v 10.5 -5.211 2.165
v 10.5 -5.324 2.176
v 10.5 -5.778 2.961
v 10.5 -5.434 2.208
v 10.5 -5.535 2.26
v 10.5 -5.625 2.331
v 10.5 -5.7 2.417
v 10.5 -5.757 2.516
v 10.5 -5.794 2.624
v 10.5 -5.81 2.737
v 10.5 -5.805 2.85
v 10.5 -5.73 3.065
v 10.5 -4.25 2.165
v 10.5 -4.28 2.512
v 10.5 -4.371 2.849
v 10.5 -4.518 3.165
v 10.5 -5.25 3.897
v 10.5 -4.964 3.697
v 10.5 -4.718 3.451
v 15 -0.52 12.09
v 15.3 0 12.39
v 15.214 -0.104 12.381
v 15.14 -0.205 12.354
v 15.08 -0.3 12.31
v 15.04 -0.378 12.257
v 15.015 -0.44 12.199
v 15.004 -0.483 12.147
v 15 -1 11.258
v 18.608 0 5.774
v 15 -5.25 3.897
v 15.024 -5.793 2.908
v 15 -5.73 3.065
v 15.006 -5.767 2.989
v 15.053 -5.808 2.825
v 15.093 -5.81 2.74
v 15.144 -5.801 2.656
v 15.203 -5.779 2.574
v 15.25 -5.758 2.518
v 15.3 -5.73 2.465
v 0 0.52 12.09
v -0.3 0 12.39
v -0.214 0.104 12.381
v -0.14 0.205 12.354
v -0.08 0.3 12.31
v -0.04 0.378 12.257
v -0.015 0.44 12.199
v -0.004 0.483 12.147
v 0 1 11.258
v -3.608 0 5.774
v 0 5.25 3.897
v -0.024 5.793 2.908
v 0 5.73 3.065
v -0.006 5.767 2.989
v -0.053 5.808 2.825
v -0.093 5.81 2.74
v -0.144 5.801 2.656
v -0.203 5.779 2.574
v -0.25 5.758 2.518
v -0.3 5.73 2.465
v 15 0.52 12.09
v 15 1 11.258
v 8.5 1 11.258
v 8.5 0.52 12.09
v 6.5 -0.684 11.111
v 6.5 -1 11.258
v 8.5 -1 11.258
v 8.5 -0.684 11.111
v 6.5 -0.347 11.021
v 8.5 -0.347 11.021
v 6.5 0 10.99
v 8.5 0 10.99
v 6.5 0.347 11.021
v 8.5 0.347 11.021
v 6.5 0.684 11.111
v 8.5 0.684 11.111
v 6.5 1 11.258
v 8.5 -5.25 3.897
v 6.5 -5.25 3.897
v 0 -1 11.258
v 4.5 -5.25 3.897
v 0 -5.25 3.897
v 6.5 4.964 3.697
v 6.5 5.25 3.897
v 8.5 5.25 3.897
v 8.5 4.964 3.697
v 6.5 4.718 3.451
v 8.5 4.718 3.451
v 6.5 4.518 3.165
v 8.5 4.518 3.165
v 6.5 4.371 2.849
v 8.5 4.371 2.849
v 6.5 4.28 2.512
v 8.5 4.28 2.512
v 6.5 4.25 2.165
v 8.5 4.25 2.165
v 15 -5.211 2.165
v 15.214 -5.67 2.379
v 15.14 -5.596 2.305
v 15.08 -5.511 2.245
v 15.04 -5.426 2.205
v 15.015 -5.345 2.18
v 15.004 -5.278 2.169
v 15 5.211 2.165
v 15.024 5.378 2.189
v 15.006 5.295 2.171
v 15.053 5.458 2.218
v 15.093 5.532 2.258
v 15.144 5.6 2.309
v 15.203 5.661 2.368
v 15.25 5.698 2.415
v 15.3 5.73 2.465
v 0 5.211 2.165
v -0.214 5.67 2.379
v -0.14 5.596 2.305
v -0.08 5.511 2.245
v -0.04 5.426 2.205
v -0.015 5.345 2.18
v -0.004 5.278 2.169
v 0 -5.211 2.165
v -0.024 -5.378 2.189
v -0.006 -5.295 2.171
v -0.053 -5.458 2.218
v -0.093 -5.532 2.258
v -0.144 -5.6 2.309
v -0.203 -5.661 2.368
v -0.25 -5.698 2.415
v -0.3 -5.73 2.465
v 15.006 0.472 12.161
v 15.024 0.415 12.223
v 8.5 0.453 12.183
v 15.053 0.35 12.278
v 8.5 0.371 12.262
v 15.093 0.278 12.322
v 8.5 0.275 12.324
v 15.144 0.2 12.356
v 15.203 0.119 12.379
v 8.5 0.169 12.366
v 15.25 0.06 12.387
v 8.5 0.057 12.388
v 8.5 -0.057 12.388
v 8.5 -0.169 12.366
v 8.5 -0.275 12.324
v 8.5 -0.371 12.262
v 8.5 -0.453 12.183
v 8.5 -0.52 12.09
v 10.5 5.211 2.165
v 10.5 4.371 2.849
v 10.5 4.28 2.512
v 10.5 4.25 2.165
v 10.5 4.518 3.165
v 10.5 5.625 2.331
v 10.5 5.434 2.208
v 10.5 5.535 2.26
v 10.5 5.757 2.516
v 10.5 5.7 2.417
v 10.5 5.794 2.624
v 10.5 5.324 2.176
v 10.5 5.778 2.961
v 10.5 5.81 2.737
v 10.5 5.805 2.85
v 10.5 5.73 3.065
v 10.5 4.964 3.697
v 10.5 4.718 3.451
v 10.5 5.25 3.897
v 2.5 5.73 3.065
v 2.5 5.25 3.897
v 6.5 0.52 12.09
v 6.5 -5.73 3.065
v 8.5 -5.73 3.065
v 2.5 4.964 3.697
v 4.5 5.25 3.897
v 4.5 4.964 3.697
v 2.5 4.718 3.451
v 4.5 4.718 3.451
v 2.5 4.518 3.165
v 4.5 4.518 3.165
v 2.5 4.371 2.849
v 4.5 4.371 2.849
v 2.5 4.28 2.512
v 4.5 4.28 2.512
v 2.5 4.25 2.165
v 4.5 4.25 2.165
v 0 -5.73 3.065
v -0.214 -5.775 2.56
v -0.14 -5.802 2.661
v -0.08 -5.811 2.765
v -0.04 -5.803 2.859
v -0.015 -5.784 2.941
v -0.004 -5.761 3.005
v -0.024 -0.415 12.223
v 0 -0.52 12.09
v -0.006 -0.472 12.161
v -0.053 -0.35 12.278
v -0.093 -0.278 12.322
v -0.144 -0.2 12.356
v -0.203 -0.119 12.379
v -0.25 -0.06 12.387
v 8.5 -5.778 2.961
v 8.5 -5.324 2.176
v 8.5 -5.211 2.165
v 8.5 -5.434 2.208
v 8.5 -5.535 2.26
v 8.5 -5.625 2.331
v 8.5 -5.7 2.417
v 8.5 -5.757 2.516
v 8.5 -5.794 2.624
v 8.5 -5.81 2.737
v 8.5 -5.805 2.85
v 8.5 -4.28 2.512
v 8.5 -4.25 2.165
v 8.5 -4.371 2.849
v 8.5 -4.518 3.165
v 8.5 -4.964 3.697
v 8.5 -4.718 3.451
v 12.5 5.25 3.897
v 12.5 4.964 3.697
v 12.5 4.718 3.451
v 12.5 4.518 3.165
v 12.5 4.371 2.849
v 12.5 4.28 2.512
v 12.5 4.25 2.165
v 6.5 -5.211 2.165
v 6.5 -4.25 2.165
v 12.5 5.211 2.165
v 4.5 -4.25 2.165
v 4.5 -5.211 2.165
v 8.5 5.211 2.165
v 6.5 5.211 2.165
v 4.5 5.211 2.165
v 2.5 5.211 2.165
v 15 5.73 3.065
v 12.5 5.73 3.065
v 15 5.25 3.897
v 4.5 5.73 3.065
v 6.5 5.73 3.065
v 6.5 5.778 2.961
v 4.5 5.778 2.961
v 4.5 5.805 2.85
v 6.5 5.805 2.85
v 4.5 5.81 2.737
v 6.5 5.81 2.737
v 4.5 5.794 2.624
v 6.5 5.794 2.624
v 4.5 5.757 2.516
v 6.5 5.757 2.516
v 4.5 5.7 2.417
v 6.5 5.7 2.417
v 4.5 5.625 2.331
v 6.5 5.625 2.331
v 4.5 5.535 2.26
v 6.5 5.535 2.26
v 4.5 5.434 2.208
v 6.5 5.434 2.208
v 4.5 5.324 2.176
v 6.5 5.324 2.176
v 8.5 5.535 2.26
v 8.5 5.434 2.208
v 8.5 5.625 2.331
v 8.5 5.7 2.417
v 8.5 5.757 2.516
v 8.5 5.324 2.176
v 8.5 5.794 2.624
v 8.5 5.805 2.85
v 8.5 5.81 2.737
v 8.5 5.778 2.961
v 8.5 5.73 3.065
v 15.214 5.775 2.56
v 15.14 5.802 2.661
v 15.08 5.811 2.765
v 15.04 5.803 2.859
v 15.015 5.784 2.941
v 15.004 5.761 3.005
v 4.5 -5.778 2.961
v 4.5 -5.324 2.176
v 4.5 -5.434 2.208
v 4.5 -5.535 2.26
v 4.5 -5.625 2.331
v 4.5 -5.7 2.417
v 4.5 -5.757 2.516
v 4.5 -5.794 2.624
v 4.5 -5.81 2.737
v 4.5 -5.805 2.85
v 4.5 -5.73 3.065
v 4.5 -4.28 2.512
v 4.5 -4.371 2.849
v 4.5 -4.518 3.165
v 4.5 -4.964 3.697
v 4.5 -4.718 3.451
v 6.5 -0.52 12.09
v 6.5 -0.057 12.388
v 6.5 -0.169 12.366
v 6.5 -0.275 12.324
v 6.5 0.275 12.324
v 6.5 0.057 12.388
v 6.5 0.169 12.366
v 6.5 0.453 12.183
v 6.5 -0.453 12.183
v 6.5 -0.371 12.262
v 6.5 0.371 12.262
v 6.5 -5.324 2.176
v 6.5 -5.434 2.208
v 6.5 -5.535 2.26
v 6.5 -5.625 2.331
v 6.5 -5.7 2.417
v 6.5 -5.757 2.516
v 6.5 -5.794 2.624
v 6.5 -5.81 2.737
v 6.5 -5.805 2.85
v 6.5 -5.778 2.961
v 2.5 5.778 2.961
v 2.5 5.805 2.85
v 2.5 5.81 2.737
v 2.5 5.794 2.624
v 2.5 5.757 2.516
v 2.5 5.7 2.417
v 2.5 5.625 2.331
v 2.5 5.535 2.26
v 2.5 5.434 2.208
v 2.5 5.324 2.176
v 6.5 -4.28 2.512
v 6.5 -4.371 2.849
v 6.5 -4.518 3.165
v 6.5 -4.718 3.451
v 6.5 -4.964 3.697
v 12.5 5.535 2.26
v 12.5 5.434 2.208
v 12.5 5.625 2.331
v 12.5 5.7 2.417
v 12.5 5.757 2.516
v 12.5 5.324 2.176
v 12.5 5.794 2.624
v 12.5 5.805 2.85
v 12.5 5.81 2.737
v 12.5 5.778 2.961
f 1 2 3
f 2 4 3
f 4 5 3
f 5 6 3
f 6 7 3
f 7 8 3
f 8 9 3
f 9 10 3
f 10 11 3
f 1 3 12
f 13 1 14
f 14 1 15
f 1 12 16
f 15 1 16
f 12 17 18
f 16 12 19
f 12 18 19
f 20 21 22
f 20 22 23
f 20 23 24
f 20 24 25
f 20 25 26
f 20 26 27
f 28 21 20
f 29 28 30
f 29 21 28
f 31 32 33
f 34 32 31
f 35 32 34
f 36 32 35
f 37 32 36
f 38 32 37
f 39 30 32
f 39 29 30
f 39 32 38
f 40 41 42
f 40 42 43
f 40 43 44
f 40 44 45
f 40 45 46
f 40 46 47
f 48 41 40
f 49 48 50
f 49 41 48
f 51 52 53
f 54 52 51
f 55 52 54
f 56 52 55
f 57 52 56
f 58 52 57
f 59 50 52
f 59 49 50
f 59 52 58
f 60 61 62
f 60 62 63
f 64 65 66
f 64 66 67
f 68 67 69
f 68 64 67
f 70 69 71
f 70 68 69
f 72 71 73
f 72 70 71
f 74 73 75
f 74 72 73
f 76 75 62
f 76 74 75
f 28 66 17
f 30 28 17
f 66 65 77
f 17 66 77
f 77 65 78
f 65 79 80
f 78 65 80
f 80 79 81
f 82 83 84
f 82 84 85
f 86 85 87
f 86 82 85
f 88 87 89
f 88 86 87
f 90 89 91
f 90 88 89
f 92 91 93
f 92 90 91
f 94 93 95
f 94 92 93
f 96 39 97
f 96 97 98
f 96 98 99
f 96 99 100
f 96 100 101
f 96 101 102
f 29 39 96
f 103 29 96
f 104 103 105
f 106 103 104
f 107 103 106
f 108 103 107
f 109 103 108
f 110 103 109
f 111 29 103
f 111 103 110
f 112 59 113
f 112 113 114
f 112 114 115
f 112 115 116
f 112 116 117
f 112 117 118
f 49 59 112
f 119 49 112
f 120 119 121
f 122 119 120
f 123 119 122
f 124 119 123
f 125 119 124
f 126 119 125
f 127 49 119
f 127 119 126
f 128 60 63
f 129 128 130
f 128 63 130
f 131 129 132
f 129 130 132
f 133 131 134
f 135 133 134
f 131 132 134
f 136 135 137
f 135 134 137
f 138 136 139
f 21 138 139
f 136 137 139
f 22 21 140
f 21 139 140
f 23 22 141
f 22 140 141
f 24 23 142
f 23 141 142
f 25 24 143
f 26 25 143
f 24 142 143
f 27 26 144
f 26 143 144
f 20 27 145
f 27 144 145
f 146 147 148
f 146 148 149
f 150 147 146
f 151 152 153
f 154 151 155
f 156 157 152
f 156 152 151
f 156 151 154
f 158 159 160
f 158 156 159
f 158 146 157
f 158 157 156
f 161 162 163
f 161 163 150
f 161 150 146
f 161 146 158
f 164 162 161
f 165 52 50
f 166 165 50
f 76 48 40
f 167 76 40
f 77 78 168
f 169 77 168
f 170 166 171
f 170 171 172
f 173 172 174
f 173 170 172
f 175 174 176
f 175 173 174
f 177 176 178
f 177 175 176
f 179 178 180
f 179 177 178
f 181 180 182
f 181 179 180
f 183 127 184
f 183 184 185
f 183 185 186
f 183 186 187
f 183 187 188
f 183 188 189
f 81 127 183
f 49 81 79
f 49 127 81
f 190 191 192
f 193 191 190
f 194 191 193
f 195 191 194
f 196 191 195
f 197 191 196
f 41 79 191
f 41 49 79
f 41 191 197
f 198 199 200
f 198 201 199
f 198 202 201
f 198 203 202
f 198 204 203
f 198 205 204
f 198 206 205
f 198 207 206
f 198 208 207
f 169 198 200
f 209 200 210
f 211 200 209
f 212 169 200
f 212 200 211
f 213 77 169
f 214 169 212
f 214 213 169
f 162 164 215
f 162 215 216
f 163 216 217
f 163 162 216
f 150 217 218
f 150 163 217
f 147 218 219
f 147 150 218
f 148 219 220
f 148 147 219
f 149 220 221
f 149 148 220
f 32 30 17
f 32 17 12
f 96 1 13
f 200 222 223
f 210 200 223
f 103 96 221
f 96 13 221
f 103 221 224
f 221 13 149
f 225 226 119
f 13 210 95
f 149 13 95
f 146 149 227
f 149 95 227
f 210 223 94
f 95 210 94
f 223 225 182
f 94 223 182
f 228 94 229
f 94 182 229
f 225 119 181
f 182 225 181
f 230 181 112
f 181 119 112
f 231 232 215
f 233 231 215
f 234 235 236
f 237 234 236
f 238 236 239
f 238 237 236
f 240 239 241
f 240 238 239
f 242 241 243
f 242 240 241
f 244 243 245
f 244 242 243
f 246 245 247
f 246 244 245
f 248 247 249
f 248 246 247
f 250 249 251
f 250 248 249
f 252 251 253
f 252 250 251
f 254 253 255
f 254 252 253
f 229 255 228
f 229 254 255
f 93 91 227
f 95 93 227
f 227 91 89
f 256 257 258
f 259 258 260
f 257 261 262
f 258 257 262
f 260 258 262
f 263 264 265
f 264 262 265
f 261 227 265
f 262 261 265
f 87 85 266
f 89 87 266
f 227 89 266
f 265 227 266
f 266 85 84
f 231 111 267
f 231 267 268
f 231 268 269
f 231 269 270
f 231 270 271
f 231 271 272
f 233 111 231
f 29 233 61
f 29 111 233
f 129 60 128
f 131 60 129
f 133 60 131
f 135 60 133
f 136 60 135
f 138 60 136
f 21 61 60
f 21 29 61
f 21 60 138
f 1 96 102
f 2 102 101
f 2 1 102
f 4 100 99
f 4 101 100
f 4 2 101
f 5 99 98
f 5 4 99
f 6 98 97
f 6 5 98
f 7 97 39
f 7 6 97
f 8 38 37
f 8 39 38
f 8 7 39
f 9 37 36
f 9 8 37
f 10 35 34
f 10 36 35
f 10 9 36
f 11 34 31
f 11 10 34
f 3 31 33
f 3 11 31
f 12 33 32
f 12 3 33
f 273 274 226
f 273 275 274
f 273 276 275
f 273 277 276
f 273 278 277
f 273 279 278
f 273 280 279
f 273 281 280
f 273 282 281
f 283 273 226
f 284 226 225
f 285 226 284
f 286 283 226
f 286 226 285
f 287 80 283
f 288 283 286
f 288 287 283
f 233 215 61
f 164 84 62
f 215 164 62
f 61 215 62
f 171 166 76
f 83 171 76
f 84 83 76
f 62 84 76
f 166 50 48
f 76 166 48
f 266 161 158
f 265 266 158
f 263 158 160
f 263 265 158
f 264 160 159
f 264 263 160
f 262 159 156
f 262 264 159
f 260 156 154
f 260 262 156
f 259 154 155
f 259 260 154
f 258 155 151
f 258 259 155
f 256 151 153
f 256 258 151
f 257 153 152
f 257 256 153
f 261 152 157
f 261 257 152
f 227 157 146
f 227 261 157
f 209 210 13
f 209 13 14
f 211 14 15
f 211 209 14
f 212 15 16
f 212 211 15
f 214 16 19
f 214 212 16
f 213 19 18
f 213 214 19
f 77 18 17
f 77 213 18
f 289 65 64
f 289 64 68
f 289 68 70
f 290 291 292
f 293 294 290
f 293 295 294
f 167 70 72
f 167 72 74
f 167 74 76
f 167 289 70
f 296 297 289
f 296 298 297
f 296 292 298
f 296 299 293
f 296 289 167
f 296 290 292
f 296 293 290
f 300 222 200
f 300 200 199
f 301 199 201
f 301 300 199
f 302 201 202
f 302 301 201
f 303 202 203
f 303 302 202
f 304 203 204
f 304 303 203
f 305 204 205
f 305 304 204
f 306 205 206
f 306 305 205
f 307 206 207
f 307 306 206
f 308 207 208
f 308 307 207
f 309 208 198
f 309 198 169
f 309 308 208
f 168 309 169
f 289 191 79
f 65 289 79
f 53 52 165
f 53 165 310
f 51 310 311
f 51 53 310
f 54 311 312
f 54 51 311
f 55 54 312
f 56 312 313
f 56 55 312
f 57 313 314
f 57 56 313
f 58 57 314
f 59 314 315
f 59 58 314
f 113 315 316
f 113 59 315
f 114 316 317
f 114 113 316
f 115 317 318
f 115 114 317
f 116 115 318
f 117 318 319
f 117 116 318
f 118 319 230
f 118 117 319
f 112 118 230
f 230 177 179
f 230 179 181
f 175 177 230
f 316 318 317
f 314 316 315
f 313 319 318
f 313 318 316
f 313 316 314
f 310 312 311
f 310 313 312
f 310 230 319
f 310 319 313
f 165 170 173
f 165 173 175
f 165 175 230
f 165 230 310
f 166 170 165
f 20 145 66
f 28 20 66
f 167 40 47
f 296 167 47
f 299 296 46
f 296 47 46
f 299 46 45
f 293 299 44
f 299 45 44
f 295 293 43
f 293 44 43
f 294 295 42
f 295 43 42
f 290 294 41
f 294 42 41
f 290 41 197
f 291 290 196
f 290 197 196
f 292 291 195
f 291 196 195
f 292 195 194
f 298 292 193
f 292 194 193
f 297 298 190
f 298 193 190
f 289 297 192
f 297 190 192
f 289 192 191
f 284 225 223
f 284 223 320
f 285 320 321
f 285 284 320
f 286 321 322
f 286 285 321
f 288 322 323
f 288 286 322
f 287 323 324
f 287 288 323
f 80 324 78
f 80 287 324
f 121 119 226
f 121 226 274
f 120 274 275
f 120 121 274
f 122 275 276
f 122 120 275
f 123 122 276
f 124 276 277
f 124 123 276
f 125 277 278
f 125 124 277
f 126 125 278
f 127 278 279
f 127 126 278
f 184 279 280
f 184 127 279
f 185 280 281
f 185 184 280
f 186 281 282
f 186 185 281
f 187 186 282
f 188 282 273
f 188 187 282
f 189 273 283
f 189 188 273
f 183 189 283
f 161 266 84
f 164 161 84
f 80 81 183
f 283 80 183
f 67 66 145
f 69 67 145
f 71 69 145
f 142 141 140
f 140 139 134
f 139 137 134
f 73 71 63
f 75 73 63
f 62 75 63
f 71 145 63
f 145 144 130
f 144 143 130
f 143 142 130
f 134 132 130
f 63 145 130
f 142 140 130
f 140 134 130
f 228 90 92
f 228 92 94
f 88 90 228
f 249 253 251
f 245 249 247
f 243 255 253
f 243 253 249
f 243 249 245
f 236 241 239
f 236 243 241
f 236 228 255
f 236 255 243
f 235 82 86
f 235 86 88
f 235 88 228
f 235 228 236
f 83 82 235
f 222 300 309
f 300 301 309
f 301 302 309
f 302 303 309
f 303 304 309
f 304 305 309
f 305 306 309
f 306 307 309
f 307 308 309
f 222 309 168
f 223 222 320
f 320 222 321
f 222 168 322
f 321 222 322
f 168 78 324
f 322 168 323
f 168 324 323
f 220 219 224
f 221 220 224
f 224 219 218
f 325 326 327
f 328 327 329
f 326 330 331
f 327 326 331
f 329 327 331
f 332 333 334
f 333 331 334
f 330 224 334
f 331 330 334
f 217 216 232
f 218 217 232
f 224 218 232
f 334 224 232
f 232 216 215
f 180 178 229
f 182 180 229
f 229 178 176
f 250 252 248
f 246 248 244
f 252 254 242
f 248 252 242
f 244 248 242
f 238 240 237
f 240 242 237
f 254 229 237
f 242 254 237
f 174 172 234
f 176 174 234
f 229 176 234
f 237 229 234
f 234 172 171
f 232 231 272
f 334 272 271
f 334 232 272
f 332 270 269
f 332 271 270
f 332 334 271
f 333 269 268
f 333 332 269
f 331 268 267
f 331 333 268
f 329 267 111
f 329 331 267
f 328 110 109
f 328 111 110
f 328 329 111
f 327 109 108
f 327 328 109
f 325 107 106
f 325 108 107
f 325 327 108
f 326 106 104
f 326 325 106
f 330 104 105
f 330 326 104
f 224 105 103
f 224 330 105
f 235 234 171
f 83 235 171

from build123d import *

# Parameters (mm, degrees)
F1_DEPTH    = 15
F4_T1_DEPTH = 20.1961524227
F5_START    = 6.5
F5_DEPTH    = 2
F6_START    = 4.5
F6_DEPTH    = 2
F7_START    = 8.5
F7_DEPTH    = 2
F8_START    = 2.5
F8_DEPTH    = 2
F9_START    = 6.5
F9_DEPTH    = 2
F10_START   = 10.5
F10_DEPTH   = 2


# Not quite as in the source:
# - a fillet or chamfer that OpenCascade refuses, or shapes differently, is made with other operations: its cross-section is extruded or revolved along the edge and cut away or added
# - an extrude whose draft closes it to a point is written as a loft to that point
# - a feature names something its author has since deleted; it is built from what else it names


with BuildPart() as f1:
    # F0 (on Right) → F1 (new body)
    with BuildSketch(Plane.YZ):
        with BuildLine():
            Line((4.25, 2.1650635095), (6.25, 2.1650635095))
            Line((6.25, 2.1650635095), (5.25, 3.897114317))
            ThreePointArc((5.25, 3.897114317), (4.5179491924, 3.1650635095), (4.25, 2.1650635095))
        make_face()
        with BuildLine():
            ThreePointArc((4.25, 2.1650635095), (4.5179491924, 3.1650635095), (5.25, 3.897114317))
            Line((5.25, 3.897114317), (1, 11.2583302492))
            ThreePointArc((1, 11.2583302492), (0, 10.9903810568), (-1, 11.2583302492))
            Line((-1, 11.2583302492), (-5.25, 3.897114317))
            ThreePointArc((-5.25, 3.897114317), (-4.5179491924, 3.1650635095), (-4.25, 2.1650635095))
            Line((-4.25, 2.1650635095), (4.25, 2.1650635095))
        make_face()
        with BuildLine():
            ThreePointArc((-1, 11.2583302492), (0, 10.9903810568), (1, 11.2583302492))
            Line((1, 11.2583302492), (0, 12.9903810568))
            Line((0, 12.9903810568), (-1, 11.2583302492))
        make_face()
        with BuildLine():
            Line((-6.25, 2.1650635095), (-4.25, 2.1650635095))
            ThreePointArc((-4.25, 2.1650635095), (-4.5179491924, 3.1650635095), (-5.25, 3.897114317))
            Line((-5.25, 3.897114317), (-6.25, 2.1650635095))
        make_face()
    extrude(amount=F1_DEPTH)

    # F1_face (on face) → F2 section 0
    with BuildSketch(Plane(origin=(0, 0, 5.7735026919), x_dir=(0, 1, 0), z_dir=(-1, 0, 0)), mode=Mode.PRIVATE) as f2_s0:
        Polygon((0, -7.2168783649), (6.25, 3.6084391824), (-6.25, 3.6084391824), align=None)
    loft([f2_s0.sketch, Vertex(-3.6084391824, 0, 5.7735026919)], ruled=True)

    # F1_face1 (on face) → F3 section 0
    with BuildSketch(Plane(origin=(15, 0, 5.7735026919), x_dir=(0, 1, 0), z_dir=(1, 0, 0)), mode=Mode.PRIVATE) as f3_s0:
        Polygon((6.25, -3.6084391824), (0, 7.2168783649), (-6.25, -3.6084391824), align=None)
    loft([f3_s0.sketch, Vertex(18.6084391824, 0, 5.7735026919)], ruled=True)

    # F4: fillet of radius 0.6 on 3 edges, made by hand

    # F4_s2 → F4_t1 (cut)
    with BuildSketch(Plane.YZ.offset(-2.5980762114)):
        with BuildLine():
            ThreePointArc((0.5196152423, 12.0903810568), (0, 12.3903810568), (-0.5196152423, 12.0903810568))
            Line((-0.5196152423, 12.0903810568), (0, 12.9903810568))
            Line((0, 12.9903810568), (0.5196152423, 12.0903810568))
        make_face()
        with BuildLine():
            ThreePointArc((-5.2107695155, 2.1650635095), (-5.7303847577, 2.4650635095), (-5.7303847577, 3.0650635095))
            Line((-5.7303847577, 3.0650635095), (-6.25, 2.1650635095))
            Line((-6.25, 2.1650635095), (-5.2107695155, 2.1650635095))
        make_face()
        with BuildLine():
            ThreePointArc((5.7303847577, 3.0650635095), (5.7303847577, 2.4650635095), (5.2107695155, 2.1650635095))
            Line((5.2107695155, 2.1650635095), (6.25, 2.1650635095))
            Line((6.25, 2.1650635095), (5.7303847577, 3.0650635095))
        make_face()
    extrude(amount=F4_T1_DEPTH, mode=Mode.SUBTRACT)

    # F0 (on Right) → F5 (cut)
    with BuildSketch(Plane.YZ.offset(F5_START)):
        with BuildLine():
            ThreePointArc((-1, 11.2583302492), (0, 10.9903810568), (1, 11.2583302492))
            Line((1, 11.2583302492), (0, 12.9903810568))
            Line((0, 12.9903810568), (-1, 11.2583302492))
        make_face()
    extrude(amount=F5_DEPTH, mode=Mode.SUBTRACT)

    # F0 (on Right) → F6 (cut)
    with BuildSketch(Plane.YZ.offset(F6_START)):
        with BuildLine():
            Line((-6.25, 2.1650635095), (-4.25, 2.1650635095))
            ThreePointArc((-4.25, 2.1650635095), (-4.5179491924, 3.1650635095), (-5.25, 3.897114317))
            Line((-5.25, 3.897114317), (-6.25, 2.1650635095))
        make_face()
    extrude(amount=F6_DEPTH, mode=Mode.SUBTRACT)

    # F0 (on Right) → F7 (cut)
    with BuildSketch(Plane.YZ.offset(F7_START)):
        with BuildLine():
            Line((-6.25, 2.1650635095), (-4.25, 2.1650635095))
            ThreePointArc((-4.25, 2.1650635095), (-4.5179491924, 3.1650635095), (-5.25, 3.897114317))
            Line((-5.25, 3.897114317), (-6.25, 2.1650635095))
        make_face()
    extrude(amount=F7_DEPTH, mode=Mode.SUBTRACT)

    # F0 (on Right) → F8 (cut)
    with BuildSketch(Plane.YZ.offset(F8_START)):
        with BuildLine():
            Line((4.25, 2.1650635095), (6.25, 2.1650635095))
            Line((6.25, 2.1650635095), (5.25, 3.897114317))
            ThreePointArc((5.25, 3.897114317), (4.5179491924, 3.1650635095), (4.25, 2.1650635095))
        make_face()
    extrude(amount=F8_DEPTH, mode=Mode.SUBTRACT)

    # F0 (on Right) → F9 (cut)
    with BuildSketch(Plane.YZ.offset(F9_START)):
        with BuildLine():
            Line((4.25, 2.1650635095), (6.25, 2.1650635095))
            Line((6.25, 2.1650635095), (5.25, 3.897114317))
            ThreePointArc((5.25, 3.897114317), (4.5179491924, 3.1650635095), (4.25, 2.1650635095))
        make_face()
    extrude(amount=F9_DEPTH, mode=Mode.SUBTRACT)

    # F0 (on Right) → F10 (cut)
    with BuildSketch(Plane.YZ.offset(F10_START)):
        with BuildLine():
            Line((4.25, 2.1650635095), (6.25, 2.1650635095))
            Line((6.25, 2.1650635095), (5.25, 3.897114317))
            ThreePointArc((5.25, 3.897114317), (4.5179491924, 3.1650635095), (4.25, 2.1650635095))
        make_face()
    extrude(amount=F10_DEPTH, mode=Mode.SUBTRACT)


solid = f1.part
